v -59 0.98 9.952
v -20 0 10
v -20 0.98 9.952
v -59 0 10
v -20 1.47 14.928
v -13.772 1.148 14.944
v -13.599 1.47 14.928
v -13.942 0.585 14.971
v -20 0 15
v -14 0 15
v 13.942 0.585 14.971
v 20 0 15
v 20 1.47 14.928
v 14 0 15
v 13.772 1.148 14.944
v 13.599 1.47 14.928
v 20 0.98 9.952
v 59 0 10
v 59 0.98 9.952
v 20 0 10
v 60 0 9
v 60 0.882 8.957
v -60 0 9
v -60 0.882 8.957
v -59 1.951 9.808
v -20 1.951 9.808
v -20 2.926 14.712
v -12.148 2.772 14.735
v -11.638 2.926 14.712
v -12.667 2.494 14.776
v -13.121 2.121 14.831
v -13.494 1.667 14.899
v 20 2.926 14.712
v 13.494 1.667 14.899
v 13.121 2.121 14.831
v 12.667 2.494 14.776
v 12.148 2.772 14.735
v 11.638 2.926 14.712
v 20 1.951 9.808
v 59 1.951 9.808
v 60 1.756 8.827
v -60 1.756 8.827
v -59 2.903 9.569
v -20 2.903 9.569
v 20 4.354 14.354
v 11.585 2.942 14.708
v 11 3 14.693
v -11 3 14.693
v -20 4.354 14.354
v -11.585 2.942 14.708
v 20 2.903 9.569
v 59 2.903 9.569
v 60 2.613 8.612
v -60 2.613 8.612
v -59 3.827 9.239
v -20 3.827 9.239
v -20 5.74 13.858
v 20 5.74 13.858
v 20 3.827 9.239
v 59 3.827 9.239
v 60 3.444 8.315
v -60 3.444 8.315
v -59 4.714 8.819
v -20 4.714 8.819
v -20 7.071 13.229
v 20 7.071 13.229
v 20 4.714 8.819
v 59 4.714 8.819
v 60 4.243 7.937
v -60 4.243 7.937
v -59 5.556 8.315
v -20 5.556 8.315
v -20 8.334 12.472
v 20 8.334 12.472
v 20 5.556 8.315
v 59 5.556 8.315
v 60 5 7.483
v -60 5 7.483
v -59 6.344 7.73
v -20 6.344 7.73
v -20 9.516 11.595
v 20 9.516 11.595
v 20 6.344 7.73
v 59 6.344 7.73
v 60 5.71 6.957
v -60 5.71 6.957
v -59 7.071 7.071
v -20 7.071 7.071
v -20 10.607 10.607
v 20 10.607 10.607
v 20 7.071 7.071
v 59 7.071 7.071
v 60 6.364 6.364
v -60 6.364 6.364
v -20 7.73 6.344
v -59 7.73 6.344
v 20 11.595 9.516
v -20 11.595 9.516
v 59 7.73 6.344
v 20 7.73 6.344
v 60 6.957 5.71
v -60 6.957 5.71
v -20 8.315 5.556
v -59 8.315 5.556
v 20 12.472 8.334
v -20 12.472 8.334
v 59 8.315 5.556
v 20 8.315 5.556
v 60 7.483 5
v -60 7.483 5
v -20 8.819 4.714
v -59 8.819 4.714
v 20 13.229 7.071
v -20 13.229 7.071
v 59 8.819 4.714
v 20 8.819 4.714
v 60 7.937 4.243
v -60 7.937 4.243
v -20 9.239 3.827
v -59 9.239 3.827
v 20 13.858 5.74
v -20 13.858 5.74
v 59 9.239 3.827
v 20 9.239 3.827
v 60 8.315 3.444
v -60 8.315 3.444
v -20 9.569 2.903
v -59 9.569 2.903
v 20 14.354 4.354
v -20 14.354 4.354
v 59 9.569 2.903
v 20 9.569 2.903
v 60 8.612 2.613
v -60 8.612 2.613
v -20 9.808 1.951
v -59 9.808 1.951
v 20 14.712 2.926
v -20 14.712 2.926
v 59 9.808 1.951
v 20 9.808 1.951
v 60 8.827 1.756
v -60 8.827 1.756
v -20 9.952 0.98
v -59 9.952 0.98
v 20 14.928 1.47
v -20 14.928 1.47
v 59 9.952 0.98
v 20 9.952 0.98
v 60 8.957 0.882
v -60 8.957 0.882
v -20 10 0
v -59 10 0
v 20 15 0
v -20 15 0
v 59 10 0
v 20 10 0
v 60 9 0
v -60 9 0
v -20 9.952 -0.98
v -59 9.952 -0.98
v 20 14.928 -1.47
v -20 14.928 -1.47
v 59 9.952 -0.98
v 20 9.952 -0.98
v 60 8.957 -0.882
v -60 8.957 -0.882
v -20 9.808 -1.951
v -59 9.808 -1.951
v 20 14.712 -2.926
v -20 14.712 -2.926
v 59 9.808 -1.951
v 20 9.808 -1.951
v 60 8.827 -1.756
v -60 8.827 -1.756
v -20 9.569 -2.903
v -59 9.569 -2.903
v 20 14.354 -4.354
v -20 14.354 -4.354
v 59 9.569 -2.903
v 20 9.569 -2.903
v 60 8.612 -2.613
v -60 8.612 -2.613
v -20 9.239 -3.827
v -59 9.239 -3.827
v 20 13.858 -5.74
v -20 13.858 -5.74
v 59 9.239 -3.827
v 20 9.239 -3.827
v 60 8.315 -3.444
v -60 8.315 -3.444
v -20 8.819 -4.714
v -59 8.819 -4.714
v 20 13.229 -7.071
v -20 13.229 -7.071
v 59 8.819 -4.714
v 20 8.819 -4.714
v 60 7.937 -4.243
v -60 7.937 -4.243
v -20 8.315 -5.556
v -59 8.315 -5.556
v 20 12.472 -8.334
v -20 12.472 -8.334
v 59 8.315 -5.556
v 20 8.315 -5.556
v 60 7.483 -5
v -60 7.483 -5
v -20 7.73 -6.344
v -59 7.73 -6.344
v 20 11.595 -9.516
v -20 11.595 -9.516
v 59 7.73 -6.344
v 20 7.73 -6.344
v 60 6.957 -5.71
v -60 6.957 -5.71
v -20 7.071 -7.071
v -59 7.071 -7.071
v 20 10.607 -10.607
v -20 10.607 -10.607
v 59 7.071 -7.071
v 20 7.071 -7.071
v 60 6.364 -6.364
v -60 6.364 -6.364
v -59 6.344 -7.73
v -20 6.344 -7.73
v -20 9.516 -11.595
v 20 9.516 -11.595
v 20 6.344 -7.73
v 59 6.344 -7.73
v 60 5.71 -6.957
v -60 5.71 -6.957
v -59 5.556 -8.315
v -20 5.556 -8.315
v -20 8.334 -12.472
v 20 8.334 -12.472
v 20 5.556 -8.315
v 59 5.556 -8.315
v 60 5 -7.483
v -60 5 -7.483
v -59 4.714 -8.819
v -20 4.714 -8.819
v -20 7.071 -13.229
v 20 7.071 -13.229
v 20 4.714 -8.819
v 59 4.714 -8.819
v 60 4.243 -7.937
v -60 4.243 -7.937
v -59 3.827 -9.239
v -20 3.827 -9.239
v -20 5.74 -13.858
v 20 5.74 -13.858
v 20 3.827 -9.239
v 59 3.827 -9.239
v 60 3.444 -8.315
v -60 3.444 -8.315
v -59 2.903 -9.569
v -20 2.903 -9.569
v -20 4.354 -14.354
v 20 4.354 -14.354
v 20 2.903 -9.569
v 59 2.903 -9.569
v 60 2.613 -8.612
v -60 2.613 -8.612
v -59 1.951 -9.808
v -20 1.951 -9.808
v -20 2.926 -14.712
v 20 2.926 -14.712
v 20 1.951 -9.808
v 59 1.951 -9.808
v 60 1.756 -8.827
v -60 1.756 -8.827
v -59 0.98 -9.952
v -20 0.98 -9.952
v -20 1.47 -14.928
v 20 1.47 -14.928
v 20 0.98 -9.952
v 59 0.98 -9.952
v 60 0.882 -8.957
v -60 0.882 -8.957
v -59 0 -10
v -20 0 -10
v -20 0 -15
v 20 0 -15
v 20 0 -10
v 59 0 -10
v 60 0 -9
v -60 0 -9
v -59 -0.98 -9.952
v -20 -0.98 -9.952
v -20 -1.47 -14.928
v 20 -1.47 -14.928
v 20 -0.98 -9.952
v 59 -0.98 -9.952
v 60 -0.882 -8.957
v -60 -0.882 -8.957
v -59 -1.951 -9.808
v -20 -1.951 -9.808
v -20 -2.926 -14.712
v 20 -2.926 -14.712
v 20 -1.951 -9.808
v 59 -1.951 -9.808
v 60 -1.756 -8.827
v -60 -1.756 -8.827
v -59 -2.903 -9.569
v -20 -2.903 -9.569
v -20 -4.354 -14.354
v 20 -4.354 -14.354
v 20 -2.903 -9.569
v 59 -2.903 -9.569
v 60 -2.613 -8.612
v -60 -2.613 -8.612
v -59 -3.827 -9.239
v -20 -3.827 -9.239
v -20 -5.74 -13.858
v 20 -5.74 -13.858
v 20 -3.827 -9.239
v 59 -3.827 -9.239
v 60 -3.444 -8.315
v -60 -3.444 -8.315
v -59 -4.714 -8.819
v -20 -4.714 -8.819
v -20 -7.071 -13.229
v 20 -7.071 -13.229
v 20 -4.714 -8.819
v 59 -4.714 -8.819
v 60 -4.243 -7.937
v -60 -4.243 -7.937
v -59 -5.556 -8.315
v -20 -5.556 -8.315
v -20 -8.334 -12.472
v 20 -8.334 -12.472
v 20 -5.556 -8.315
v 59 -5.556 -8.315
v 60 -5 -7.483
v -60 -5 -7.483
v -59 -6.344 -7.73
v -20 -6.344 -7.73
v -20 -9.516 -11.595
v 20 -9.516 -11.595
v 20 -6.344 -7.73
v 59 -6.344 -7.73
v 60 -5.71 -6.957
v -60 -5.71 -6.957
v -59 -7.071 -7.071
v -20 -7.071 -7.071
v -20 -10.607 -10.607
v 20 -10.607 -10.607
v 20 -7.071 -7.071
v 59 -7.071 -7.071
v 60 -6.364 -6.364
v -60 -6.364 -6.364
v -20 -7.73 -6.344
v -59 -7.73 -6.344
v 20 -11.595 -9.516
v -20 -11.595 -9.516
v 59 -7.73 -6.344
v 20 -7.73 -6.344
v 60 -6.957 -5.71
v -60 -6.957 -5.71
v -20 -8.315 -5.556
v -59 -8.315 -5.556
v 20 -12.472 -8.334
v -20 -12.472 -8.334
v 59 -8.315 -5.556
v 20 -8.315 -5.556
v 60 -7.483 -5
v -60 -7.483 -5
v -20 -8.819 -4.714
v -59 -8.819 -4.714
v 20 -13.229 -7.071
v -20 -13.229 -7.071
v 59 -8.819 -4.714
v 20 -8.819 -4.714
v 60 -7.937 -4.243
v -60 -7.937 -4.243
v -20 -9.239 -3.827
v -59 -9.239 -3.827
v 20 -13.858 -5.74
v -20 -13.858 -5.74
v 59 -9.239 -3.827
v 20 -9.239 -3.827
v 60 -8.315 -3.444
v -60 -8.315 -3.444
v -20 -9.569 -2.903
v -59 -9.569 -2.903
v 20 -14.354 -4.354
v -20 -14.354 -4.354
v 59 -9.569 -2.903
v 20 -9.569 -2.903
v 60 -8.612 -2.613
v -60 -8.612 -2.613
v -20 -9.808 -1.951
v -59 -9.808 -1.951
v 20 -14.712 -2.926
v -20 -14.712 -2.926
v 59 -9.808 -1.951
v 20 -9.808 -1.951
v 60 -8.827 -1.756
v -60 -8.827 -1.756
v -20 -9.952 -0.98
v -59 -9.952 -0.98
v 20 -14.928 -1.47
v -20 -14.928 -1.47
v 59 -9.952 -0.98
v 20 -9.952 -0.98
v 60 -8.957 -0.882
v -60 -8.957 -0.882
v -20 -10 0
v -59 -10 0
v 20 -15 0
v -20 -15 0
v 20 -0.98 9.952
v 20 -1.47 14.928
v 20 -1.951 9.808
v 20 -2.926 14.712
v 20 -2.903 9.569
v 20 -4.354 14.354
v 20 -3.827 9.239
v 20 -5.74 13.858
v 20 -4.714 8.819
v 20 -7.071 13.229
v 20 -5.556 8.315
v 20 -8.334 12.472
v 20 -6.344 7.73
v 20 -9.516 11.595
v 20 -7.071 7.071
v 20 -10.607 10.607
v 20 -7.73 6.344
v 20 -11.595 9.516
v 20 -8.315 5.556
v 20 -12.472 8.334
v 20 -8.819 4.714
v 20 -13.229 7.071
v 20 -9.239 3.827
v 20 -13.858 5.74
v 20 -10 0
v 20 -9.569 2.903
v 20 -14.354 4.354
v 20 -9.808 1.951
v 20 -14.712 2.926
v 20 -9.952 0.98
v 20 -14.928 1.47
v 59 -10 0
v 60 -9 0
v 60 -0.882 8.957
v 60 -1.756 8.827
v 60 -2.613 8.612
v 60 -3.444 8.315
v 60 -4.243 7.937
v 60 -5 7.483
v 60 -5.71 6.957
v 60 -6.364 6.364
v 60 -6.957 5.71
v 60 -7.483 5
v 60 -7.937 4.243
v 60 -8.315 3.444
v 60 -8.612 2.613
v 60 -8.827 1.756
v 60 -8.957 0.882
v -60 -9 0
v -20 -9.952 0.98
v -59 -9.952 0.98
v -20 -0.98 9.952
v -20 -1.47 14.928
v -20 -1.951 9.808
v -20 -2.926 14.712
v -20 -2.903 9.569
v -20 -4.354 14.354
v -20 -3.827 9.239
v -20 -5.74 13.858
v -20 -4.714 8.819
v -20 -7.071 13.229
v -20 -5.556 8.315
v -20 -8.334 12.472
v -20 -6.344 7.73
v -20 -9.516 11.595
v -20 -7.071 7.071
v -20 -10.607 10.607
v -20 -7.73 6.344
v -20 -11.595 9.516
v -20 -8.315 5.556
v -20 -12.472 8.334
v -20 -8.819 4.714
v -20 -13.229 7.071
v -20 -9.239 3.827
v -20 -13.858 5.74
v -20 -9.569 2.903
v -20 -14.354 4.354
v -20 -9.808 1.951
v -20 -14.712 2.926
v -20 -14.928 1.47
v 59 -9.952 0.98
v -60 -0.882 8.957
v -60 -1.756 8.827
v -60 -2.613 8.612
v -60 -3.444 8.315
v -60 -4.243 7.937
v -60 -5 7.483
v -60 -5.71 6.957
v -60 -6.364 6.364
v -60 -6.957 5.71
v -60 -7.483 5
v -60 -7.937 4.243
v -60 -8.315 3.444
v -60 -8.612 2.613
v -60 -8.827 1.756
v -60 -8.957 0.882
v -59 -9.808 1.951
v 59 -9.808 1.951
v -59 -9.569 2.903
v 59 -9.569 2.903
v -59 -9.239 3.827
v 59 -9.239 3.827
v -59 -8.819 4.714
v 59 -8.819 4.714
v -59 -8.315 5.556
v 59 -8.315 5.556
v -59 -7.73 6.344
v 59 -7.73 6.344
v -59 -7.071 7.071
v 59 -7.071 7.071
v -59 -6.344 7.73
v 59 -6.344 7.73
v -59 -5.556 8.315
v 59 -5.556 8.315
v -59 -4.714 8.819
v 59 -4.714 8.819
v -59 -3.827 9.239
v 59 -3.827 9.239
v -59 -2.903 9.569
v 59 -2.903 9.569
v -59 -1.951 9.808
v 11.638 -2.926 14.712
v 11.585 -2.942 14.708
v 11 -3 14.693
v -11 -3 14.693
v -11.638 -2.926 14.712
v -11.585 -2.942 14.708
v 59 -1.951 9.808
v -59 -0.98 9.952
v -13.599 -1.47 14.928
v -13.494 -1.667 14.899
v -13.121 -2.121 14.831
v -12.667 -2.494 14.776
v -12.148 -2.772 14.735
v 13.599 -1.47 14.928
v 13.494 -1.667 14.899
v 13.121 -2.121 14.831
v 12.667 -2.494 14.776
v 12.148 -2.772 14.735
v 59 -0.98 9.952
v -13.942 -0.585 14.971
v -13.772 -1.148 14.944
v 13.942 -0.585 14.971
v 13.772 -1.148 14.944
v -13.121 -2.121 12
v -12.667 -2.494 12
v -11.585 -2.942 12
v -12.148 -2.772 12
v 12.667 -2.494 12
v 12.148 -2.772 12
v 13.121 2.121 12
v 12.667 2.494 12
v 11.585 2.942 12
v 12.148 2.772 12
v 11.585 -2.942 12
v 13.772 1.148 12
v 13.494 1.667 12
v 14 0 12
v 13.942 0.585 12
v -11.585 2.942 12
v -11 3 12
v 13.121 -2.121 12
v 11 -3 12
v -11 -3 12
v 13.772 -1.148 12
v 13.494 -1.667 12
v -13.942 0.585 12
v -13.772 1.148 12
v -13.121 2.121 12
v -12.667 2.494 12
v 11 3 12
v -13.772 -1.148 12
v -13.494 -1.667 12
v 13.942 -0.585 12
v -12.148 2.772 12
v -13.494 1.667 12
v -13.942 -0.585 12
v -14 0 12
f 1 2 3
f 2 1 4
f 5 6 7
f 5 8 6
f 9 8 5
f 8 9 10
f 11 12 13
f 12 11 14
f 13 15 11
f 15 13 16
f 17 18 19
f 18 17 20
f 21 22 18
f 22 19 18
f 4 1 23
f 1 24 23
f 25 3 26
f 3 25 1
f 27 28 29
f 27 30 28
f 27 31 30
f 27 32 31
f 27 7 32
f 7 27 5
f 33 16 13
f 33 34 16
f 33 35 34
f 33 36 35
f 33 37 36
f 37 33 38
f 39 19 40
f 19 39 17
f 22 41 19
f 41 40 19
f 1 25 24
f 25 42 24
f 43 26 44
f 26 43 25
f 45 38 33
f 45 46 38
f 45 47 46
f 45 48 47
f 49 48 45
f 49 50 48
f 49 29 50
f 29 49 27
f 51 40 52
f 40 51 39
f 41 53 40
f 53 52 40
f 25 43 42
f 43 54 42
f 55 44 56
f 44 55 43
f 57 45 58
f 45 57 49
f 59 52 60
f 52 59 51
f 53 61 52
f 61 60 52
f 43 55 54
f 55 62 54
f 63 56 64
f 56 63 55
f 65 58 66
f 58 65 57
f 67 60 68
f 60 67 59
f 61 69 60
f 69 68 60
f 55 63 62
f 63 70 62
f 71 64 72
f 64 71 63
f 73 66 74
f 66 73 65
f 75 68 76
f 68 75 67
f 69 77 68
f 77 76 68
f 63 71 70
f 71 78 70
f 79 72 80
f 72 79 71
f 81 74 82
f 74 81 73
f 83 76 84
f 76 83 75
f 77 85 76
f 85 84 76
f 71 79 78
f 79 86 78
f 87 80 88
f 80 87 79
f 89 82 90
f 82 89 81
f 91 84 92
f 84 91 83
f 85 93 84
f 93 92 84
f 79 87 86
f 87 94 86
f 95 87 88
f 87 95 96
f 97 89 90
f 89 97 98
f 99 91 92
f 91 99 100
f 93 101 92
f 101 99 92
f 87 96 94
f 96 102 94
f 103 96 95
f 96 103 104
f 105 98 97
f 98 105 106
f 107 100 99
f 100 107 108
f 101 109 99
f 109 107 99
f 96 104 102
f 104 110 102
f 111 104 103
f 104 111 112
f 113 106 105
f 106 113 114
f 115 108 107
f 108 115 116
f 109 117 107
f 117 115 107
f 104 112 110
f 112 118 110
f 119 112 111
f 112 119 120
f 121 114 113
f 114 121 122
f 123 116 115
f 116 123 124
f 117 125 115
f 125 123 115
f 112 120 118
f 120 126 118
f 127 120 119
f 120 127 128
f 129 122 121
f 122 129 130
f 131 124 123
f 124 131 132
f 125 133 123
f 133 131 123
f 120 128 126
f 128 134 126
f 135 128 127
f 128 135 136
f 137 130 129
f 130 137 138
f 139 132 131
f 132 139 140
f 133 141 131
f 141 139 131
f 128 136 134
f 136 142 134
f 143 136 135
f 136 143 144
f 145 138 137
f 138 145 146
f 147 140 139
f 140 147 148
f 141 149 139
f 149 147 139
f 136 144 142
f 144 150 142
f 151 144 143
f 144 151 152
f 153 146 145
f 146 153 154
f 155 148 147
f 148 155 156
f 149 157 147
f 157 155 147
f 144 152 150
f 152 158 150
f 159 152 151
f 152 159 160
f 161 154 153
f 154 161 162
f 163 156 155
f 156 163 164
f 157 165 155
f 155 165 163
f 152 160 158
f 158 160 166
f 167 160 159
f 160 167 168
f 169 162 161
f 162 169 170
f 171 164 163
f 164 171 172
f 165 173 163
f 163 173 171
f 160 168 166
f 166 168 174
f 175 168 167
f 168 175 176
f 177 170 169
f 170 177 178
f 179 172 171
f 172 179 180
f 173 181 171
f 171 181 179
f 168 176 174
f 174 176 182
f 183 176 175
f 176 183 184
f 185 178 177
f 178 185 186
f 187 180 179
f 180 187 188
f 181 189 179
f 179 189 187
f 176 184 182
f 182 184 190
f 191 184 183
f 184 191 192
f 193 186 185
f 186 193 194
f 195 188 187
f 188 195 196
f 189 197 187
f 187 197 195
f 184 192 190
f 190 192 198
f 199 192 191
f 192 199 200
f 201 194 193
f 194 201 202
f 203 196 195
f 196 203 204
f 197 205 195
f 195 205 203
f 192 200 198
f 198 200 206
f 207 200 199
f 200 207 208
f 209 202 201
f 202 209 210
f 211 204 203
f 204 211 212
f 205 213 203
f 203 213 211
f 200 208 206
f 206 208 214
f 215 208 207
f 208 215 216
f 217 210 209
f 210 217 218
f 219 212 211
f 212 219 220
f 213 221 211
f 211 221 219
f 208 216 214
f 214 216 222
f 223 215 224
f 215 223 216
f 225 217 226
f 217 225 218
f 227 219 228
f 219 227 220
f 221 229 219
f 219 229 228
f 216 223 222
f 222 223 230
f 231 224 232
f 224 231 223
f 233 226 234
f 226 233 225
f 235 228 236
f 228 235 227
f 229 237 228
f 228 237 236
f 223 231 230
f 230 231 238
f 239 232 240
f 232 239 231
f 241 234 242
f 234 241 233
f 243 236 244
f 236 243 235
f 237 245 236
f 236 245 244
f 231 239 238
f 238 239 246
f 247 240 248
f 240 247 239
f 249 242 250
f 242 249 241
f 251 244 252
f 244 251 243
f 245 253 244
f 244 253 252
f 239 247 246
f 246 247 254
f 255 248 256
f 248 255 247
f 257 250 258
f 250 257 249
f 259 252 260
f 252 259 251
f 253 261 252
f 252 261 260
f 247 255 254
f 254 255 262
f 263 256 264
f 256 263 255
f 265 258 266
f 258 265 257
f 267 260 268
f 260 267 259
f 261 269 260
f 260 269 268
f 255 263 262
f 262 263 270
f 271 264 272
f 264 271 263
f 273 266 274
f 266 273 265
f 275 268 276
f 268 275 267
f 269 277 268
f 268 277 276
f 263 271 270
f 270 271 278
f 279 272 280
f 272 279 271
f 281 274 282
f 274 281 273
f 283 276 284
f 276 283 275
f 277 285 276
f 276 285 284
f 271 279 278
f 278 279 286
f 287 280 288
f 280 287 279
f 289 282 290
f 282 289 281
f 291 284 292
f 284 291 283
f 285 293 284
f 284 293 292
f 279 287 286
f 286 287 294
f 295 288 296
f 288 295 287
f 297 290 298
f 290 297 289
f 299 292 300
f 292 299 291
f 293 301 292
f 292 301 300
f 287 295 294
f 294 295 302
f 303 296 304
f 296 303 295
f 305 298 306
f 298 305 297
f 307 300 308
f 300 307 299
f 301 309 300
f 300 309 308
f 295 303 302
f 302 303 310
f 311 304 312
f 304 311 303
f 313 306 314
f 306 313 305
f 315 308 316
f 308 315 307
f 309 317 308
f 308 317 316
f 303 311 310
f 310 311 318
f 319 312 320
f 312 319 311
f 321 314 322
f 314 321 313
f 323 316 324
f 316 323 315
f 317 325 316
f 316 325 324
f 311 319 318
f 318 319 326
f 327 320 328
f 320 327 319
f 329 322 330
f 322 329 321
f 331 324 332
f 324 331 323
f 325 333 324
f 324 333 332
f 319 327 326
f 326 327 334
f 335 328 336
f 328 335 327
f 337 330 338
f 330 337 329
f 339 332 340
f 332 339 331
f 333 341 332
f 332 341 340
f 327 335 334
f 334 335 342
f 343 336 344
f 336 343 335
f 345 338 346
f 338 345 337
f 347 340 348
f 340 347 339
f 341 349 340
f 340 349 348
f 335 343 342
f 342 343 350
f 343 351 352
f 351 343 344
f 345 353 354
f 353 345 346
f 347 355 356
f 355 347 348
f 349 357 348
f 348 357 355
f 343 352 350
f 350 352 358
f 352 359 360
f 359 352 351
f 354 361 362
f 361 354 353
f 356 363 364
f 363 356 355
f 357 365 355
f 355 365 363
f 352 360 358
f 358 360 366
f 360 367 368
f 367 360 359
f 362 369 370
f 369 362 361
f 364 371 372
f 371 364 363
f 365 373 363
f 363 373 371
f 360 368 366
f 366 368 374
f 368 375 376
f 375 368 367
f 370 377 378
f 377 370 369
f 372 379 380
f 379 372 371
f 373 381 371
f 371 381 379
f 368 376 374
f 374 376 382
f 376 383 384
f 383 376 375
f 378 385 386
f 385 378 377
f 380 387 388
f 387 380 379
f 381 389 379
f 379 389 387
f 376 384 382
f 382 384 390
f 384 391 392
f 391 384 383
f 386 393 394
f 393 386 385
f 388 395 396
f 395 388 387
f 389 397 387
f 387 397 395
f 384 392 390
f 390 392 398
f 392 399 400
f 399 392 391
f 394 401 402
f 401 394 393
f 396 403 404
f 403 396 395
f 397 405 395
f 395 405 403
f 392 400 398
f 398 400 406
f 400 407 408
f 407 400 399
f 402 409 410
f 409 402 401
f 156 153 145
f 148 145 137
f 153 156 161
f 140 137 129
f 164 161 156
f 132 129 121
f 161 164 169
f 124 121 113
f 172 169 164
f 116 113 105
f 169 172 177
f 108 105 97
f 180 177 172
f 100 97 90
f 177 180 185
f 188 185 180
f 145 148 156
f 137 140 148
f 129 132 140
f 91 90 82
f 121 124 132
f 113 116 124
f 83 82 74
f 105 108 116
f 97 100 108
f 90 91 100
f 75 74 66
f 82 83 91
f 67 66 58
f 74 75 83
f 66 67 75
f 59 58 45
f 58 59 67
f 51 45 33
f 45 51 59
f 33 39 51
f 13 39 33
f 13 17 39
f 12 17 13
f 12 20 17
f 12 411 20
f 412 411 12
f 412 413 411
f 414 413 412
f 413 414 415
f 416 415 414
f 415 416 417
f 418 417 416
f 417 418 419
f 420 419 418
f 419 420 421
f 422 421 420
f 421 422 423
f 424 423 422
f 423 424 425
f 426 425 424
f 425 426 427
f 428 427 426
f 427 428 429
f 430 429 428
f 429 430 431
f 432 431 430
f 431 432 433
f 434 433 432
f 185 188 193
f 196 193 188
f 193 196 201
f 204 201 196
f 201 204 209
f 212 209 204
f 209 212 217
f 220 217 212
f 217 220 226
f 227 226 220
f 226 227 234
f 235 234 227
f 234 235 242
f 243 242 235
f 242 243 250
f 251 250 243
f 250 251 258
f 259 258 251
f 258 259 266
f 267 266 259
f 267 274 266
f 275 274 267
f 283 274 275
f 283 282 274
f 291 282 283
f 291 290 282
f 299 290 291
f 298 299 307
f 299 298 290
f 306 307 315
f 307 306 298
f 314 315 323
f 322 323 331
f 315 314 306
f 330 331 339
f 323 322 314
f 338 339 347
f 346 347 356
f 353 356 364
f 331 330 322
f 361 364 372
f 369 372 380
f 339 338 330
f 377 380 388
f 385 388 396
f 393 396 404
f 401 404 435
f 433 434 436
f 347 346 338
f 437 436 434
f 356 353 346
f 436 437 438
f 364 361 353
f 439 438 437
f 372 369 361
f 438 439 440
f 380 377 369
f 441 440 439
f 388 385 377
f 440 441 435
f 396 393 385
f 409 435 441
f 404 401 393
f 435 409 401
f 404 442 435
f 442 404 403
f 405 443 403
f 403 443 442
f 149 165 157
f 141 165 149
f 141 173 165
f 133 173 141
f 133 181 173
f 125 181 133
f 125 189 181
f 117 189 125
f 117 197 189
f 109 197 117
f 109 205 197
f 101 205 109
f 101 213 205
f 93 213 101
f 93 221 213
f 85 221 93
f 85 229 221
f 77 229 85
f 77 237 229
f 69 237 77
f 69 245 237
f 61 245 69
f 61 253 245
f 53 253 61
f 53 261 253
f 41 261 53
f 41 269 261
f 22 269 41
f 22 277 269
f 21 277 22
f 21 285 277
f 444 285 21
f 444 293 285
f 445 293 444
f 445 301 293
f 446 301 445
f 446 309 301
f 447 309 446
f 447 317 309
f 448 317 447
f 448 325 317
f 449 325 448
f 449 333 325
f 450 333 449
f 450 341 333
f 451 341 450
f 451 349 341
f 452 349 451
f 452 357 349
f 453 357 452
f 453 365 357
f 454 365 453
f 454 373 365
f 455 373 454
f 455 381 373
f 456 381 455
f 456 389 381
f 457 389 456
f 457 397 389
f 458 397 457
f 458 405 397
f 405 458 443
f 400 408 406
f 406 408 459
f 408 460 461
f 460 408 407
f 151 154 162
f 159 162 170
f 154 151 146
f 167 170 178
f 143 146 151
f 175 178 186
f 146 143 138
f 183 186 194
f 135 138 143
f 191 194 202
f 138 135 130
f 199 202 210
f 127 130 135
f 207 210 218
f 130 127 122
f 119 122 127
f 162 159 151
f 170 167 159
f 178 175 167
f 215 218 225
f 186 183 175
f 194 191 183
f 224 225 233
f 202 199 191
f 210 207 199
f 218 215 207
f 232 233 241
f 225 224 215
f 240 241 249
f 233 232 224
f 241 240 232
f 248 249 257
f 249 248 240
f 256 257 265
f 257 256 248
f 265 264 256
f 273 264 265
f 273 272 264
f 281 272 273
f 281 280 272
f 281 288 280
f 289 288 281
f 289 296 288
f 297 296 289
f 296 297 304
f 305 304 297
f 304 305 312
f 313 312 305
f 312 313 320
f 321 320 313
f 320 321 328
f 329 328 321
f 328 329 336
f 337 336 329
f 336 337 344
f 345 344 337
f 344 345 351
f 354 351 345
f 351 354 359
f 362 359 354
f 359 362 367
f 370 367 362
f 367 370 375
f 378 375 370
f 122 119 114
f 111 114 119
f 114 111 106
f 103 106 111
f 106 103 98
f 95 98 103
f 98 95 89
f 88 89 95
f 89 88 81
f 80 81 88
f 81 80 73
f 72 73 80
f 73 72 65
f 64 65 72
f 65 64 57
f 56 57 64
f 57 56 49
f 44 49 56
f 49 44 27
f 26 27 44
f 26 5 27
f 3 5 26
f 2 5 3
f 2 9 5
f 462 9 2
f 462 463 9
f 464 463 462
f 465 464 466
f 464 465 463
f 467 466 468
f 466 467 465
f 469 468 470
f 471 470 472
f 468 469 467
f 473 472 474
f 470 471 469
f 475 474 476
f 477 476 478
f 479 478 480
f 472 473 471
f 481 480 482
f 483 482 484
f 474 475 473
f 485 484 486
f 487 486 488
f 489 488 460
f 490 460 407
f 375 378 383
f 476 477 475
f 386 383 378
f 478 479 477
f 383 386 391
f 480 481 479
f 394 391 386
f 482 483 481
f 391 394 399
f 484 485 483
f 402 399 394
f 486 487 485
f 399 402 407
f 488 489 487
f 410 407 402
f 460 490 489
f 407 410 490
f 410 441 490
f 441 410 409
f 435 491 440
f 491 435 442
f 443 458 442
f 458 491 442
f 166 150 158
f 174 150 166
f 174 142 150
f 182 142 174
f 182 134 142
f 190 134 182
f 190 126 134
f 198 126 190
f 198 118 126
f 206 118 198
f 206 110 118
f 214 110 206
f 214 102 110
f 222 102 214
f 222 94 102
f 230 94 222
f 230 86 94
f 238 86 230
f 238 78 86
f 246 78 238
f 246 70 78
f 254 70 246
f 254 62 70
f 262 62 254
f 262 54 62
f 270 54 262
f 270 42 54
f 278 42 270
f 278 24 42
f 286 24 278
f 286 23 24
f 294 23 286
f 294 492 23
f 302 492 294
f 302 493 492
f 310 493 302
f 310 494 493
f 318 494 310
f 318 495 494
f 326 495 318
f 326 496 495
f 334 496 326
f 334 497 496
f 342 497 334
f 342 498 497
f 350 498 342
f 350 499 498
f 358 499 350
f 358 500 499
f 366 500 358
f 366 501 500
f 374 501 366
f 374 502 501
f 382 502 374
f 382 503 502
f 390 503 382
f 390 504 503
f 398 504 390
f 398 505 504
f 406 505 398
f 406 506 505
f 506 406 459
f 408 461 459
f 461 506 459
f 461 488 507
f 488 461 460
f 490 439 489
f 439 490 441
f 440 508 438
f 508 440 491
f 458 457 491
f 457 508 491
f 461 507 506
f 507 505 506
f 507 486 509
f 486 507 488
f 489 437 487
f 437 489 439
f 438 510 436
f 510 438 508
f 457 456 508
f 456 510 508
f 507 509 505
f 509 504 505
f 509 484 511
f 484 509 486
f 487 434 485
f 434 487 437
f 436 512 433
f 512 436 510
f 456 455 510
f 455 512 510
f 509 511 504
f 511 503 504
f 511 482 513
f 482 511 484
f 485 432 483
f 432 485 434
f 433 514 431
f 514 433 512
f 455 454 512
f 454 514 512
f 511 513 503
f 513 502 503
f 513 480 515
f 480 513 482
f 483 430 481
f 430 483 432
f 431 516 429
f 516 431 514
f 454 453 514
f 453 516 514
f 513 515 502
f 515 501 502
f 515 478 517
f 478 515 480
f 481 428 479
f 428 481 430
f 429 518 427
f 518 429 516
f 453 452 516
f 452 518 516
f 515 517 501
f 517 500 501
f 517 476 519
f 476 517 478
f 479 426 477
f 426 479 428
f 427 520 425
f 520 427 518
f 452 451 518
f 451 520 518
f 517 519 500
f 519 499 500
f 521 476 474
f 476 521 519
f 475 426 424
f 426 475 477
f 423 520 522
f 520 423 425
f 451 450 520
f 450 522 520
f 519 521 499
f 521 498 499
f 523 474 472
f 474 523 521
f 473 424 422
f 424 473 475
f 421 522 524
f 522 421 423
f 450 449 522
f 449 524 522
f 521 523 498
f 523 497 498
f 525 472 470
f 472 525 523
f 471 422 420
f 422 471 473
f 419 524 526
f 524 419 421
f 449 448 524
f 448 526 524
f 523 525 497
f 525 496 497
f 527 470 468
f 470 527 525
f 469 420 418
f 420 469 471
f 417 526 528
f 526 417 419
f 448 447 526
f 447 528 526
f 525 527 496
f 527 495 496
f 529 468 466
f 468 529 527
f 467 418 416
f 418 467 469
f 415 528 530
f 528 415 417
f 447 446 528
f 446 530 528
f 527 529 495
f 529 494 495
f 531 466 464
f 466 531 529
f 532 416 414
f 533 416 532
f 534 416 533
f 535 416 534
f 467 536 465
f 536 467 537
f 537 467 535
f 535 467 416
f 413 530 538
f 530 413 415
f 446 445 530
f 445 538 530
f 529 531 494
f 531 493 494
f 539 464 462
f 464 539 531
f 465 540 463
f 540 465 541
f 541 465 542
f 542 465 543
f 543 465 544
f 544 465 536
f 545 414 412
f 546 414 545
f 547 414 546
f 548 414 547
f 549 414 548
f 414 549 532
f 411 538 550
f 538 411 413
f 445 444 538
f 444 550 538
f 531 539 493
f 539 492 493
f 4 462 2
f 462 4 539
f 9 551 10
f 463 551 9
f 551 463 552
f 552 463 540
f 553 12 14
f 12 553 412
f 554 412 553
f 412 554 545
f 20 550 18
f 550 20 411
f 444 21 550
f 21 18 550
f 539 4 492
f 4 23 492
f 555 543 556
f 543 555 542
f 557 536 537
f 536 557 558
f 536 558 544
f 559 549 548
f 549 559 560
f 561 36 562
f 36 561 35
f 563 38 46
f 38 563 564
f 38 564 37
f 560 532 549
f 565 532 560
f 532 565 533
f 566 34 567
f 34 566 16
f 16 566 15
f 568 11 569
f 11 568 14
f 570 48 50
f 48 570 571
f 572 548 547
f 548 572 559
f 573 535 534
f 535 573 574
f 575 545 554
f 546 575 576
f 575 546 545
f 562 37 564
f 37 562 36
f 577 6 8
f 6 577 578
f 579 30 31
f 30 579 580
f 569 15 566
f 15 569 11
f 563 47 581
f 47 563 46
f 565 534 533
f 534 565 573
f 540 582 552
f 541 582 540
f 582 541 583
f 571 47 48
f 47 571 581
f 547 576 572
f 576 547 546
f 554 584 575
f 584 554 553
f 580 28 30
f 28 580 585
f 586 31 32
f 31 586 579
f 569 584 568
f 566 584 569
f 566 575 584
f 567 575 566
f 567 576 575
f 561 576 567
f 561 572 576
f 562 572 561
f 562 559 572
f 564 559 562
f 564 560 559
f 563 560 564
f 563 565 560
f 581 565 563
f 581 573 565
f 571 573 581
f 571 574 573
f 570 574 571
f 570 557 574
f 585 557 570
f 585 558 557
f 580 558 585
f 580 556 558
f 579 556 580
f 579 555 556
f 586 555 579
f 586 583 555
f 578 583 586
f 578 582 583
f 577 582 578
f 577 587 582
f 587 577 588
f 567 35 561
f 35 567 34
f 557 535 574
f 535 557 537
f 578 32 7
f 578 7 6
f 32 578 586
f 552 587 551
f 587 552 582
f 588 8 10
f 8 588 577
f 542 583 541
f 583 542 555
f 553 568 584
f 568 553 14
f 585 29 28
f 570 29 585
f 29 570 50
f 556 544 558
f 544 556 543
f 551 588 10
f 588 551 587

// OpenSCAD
// Stepped Shaft with Keyway
// Total Length: 120 mm along X-axis

$fn = 64;

// --- Dimensions ---
d1 = 20;          // Diameter of first end section (mm)
l1 = 40;          // Length of first end section (mm)

d2 = 30;          // Diameter of middle section (mm)
l2 = 40;          // Length of middle section (mm)

d3 = 20;          // Diameter of second end section (mm)
l3 = 40;          // Length of second end section (mm)

chamfer = 1.0;    // End chamfer size (mm)

// Keyway dimensions (on middle section)
keyway_w = 6.0;   // Keyway width (mm)
keyway_d = 3.0;   // Keyway depth (mm)
keyway_l = 28.0;  // Keyway overall length (mm)

// --- Calculated Parameters ---
r1 = d1 / 2;
r2 = d2 / 2;
r3 = d3 / 2;

x0 = -(l1 + l2 / 2); // -60 mm
x1 = -l2 / 2;        // -20 mm
x2 = l2 / 2;         //  20 mm
x3 = l1 + l2 / 2;    //  60 mm

// --- Modules ---

module shaft_body() {
    // 2D revolution profile rotated to lie along the X-axis
    rotate([0, 90, 0])
        rotate_extrude($fn = $fn)
            polygon(points = [
                [0, x0],
                [r1 - chamfer, x0],
                [r1, x0 + chamfer],
                [r1, x1],
                [r2, x1],
                [r2, x2],
                [r3, x2],
                [r3, x3 - chamfer],
                [r3 - chamfer, x3],
                [0, x3]
            ]);
}

module keyway_cutter() {
    // Cutter for an endmill-style rounded keyway on top (+Z) of middle section
    slot_straight = keyway_l - keyway_w;
    h_cut = keyway_d + 2.0; // Overshoot above shaft surface for clean boolean
    
    translate([0, 0, r2 - keyway_d])
        hull() {
            translate([-slot_straight / 2, 0, 0])
                cylinder(d = keyway_w, h = h_cut, $fn = 32);
            translate([slot_straight / 2, 0, 0])
                cylinder(d = keyway_w, h = h_cut, $fn = 32);
        }
}

module stepped_shaft() {
    difference() {
        shaft_body();
        keyway_cutter();
    }
}

// --- Main Assembly ---
stepped_shaft();
